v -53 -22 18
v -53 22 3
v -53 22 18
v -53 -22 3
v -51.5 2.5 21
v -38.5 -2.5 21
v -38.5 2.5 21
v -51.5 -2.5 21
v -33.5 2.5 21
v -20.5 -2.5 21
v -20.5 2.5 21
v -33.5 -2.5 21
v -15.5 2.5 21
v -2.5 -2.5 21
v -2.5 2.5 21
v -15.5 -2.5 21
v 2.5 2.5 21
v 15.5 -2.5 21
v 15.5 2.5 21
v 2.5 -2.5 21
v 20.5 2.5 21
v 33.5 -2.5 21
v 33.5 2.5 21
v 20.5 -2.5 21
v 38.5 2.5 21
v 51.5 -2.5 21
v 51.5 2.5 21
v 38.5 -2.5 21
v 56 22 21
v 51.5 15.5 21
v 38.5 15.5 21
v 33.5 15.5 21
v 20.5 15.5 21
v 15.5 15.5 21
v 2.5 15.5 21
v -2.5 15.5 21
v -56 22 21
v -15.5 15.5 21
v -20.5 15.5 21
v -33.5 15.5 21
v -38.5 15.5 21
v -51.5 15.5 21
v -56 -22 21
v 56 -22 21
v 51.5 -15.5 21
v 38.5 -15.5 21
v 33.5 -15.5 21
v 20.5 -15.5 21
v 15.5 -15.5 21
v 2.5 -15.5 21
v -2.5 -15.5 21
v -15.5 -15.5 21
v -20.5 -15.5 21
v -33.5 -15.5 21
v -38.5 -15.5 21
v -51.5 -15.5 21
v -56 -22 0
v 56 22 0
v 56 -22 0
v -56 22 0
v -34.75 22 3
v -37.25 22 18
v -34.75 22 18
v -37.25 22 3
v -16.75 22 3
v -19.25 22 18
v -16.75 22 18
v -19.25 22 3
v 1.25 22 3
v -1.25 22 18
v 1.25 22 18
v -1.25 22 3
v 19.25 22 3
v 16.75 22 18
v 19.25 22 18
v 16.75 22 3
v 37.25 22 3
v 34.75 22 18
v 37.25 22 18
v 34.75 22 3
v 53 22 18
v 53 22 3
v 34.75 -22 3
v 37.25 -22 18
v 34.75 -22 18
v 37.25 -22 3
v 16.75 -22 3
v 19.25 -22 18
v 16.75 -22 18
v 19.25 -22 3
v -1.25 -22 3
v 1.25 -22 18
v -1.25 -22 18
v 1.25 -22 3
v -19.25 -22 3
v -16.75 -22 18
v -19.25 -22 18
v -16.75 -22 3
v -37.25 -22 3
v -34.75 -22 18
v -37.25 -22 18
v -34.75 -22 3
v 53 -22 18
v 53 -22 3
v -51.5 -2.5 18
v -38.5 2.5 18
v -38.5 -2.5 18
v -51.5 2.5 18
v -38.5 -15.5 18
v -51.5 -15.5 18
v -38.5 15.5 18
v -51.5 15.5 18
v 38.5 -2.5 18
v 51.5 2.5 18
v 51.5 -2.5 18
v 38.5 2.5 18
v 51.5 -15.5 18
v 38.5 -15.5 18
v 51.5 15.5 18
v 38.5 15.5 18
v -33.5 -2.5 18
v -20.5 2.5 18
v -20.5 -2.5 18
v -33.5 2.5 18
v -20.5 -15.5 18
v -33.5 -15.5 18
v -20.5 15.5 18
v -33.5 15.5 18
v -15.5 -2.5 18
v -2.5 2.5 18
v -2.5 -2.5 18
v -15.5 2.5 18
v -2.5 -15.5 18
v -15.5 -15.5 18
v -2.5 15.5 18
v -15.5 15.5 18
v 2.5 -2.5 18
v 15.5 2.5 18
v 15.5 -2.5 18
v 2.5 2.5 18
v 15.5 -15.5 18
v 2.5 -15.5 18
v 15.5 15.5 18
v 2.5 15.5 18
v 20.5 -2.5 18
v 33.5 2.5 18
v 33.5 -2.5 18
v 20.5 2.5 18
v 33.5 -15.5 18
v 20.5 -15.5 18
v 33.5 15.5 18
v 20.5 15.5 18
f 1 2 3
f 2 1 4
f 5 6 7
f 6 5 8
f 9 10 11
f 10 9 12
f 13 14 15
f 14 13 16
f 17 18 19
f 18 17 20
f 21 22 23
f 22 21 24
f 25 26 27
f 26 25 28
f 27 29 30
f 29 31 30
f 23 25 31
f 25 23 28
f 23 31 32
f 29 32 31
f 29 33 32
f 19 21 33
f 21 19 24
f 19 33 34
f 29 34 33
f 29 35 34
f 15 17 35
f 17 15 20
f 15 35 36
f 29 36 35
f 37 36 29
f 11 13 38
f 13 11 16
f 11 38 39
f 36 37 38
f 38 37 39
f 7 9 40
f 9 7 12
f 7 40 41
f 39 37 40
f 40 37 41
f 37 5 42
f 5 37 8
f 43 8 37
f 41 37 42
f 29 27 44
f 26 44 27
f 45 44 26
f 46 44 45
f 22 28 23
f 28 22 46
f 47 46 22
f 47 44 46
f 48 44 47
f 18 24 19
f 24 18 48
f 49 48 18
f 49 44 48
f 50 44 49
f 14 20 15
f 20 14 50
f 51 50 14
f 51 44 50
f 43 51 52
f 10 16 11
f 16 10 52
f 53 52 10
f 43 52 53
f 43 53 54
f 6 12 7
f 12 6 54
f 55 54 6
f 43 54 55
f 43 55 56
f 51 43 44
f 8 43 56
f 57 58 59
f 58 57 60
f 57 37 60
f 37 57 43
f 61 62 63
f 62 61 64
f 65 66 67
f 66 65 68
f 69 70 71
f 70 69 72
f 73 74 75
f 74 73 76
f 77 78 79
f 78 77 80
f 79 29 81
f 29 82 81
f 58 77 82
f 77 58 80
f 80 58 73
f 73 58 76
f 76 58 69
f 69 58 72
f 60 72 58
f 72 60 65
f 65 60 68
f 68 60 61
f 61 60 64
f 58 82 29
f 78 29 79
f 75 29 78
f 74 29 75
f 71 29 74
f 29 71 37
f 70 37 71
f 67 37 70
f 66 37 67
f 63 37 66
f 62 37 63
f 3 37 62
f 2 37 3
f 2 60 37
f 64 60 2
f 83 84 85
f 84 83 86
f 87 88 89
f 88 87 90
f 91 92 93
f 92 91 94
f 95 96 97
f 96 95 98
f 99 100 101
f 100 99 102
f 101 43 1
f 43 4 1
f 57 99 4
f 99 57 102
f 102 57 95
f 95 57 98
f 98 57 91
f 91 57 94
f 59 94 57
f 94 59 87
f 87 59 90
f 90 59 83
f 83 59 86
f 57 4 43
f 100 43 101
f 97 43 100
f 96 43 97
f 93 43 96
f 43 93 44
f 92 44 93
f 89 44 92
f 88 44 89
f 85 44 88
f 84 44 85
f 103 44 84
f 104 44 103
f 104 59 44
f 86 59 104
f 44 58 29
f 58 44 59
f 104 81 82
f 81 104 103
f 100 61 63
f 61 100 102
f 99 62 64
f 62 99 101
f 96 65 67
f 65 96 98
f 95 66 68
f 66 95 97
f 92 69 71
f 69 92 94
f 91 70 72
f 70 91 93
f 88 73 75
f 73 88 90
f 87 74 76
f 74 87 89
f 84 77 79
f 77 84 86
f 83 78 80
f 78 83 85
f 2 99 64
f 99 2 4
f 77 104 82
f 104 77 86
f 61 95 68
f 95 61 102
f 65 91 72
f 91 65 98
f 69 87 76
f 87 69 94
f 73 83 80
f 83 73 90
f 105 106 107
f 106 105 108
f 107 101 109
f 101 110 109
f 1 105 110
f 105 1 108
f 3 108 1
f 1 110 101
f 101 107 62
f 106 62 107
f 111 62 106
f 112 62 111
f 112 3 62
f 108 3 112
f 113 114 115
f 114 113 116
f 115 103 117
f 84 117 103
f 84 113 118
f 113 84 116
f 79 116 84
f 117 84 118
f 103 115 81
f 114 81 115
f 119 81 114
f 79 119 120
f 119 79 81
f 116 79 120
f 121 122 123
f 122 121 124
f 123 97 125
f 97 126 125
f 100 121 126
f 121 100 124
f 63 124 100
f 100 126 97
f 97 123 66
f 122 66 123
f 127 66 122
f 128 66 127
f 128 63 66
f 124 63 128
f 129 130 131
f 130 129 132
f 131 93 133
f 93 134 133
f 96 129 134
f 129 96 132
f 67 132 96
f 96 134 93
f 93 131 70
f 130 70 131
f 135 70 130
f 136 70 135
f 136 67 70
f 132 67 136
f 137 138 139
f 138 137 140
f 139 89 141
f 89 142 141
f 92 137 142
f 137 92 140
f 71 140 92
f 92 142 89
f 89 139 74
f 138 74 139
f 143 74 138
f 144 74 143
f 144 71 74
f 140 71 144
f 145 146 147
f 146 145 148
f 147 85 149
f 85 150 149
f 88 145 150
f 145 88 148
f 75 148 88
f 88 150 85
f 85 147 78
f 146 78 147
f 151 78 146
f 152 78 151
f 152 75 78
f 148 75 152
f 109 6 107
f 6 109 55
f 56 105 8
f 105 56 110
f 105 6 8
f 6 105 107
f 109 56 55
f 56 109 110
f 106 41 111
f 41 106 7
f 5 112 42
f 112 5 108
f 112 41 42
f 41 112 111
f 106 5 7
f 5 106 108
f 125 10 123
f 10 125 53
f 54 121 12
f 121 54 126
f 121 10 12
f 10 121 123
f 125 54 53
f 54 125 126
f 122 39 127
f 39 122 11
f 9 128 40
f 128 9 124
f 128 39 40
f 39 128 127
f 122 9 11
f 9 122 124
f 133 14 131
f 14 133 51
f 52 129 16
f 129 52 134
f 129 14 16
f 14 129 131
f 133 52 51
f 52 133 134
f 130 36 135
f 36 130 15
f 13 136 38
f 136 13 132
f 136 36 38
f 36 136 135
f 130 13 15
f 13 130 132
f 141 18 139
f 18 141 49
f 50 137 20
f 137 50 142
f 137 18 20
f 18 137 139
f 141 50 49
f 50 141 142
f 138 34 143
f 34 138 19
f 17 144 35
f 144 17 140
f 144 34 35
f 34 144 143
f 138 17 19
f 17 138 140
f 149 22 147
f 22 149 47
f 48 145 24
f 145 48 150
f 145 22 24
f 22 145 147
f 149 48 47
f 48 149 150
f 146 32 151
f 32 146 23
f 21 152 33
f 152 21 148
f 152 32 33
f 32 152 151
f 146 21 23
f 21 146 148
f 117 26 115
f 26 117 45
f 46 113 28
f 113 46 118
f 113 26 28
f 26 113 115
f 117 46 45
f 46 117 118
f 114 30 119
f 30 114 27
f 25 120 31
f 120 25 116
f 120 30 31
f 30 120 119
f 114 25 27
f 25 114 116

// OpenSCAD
// KNOWN-WRONG PART (must fail): the deck sits at z = 18 to 21 instead of 22 to 25
// Open-sided rack for 12 standard 12.5 mm square cuvettes (2 rows of 6)
// Category: benchware. A base plate and a perforated deck joined by seven upright walls that run
// front to back; the long sides stay open, so the cuvettes can be seen and read in the rack.
// The deck bridges only 15.5 mm between walls, so it prints without supports.
// Print: PLA or PETG, base on the bed, 0.2 mm layers.
// SPDX-License-Identifier: CERN-OHL-P-2.0

/* [Rack] */
plate = [112, 44];        // X, Y of the base plate and the deck [mm]
base_t = 3;               // base plate z = 0 .. 3
deck_z = 18;              // deck from z = 22 ...
deck_t = 3;               // ... to z = 25
end_t = 3;                // end walls, flush with the short ends
rib_t = 2.5;              // inner ribs
rib_x = [-36, -18, 0, 18, 36];
cols = 6;                 // holes along X
rows = 2;                 // holes along Y
pitch = 18;               // centre-to-centre in X and Y
hole = 13;                // square hole for a 12.5 mm cuvette

/* [Hidden] */
eps = 0.01;
H = deck_z + deck_t;

difference() {
    union() {
        translate([-plate.x / 2, -plate.y / 2, 0]) cube([plate.x, plate.y, base_t]);
        translate([-plate.x / 2, -plate.y / 2, deck_z]) cube([plate.x, plate.y, deck_t]);
        for (s = [-1, 1])
            translate([s > 0 ? plate.x / 2 - end_t : -plate.x / 2, -plate.y / 2, 0]) cube([end_t, plate.y, H]);
        for (x = rib_x)
            translate([x - rib_t / 2, -plate.y / 2, 0]) cube([rib_t, plate.y, H]);
    }
    for (i = [0 : cols - 1], j = [0 : rows - 1])
        translate([(i - (cols - 1) / 2) * pitch - hole / 2, (j - (rows - 1) / 2) * pitch - hole / 2, deck_z - eps])
            cube([hole, hole, deck_t + 2 * eps]);
}
